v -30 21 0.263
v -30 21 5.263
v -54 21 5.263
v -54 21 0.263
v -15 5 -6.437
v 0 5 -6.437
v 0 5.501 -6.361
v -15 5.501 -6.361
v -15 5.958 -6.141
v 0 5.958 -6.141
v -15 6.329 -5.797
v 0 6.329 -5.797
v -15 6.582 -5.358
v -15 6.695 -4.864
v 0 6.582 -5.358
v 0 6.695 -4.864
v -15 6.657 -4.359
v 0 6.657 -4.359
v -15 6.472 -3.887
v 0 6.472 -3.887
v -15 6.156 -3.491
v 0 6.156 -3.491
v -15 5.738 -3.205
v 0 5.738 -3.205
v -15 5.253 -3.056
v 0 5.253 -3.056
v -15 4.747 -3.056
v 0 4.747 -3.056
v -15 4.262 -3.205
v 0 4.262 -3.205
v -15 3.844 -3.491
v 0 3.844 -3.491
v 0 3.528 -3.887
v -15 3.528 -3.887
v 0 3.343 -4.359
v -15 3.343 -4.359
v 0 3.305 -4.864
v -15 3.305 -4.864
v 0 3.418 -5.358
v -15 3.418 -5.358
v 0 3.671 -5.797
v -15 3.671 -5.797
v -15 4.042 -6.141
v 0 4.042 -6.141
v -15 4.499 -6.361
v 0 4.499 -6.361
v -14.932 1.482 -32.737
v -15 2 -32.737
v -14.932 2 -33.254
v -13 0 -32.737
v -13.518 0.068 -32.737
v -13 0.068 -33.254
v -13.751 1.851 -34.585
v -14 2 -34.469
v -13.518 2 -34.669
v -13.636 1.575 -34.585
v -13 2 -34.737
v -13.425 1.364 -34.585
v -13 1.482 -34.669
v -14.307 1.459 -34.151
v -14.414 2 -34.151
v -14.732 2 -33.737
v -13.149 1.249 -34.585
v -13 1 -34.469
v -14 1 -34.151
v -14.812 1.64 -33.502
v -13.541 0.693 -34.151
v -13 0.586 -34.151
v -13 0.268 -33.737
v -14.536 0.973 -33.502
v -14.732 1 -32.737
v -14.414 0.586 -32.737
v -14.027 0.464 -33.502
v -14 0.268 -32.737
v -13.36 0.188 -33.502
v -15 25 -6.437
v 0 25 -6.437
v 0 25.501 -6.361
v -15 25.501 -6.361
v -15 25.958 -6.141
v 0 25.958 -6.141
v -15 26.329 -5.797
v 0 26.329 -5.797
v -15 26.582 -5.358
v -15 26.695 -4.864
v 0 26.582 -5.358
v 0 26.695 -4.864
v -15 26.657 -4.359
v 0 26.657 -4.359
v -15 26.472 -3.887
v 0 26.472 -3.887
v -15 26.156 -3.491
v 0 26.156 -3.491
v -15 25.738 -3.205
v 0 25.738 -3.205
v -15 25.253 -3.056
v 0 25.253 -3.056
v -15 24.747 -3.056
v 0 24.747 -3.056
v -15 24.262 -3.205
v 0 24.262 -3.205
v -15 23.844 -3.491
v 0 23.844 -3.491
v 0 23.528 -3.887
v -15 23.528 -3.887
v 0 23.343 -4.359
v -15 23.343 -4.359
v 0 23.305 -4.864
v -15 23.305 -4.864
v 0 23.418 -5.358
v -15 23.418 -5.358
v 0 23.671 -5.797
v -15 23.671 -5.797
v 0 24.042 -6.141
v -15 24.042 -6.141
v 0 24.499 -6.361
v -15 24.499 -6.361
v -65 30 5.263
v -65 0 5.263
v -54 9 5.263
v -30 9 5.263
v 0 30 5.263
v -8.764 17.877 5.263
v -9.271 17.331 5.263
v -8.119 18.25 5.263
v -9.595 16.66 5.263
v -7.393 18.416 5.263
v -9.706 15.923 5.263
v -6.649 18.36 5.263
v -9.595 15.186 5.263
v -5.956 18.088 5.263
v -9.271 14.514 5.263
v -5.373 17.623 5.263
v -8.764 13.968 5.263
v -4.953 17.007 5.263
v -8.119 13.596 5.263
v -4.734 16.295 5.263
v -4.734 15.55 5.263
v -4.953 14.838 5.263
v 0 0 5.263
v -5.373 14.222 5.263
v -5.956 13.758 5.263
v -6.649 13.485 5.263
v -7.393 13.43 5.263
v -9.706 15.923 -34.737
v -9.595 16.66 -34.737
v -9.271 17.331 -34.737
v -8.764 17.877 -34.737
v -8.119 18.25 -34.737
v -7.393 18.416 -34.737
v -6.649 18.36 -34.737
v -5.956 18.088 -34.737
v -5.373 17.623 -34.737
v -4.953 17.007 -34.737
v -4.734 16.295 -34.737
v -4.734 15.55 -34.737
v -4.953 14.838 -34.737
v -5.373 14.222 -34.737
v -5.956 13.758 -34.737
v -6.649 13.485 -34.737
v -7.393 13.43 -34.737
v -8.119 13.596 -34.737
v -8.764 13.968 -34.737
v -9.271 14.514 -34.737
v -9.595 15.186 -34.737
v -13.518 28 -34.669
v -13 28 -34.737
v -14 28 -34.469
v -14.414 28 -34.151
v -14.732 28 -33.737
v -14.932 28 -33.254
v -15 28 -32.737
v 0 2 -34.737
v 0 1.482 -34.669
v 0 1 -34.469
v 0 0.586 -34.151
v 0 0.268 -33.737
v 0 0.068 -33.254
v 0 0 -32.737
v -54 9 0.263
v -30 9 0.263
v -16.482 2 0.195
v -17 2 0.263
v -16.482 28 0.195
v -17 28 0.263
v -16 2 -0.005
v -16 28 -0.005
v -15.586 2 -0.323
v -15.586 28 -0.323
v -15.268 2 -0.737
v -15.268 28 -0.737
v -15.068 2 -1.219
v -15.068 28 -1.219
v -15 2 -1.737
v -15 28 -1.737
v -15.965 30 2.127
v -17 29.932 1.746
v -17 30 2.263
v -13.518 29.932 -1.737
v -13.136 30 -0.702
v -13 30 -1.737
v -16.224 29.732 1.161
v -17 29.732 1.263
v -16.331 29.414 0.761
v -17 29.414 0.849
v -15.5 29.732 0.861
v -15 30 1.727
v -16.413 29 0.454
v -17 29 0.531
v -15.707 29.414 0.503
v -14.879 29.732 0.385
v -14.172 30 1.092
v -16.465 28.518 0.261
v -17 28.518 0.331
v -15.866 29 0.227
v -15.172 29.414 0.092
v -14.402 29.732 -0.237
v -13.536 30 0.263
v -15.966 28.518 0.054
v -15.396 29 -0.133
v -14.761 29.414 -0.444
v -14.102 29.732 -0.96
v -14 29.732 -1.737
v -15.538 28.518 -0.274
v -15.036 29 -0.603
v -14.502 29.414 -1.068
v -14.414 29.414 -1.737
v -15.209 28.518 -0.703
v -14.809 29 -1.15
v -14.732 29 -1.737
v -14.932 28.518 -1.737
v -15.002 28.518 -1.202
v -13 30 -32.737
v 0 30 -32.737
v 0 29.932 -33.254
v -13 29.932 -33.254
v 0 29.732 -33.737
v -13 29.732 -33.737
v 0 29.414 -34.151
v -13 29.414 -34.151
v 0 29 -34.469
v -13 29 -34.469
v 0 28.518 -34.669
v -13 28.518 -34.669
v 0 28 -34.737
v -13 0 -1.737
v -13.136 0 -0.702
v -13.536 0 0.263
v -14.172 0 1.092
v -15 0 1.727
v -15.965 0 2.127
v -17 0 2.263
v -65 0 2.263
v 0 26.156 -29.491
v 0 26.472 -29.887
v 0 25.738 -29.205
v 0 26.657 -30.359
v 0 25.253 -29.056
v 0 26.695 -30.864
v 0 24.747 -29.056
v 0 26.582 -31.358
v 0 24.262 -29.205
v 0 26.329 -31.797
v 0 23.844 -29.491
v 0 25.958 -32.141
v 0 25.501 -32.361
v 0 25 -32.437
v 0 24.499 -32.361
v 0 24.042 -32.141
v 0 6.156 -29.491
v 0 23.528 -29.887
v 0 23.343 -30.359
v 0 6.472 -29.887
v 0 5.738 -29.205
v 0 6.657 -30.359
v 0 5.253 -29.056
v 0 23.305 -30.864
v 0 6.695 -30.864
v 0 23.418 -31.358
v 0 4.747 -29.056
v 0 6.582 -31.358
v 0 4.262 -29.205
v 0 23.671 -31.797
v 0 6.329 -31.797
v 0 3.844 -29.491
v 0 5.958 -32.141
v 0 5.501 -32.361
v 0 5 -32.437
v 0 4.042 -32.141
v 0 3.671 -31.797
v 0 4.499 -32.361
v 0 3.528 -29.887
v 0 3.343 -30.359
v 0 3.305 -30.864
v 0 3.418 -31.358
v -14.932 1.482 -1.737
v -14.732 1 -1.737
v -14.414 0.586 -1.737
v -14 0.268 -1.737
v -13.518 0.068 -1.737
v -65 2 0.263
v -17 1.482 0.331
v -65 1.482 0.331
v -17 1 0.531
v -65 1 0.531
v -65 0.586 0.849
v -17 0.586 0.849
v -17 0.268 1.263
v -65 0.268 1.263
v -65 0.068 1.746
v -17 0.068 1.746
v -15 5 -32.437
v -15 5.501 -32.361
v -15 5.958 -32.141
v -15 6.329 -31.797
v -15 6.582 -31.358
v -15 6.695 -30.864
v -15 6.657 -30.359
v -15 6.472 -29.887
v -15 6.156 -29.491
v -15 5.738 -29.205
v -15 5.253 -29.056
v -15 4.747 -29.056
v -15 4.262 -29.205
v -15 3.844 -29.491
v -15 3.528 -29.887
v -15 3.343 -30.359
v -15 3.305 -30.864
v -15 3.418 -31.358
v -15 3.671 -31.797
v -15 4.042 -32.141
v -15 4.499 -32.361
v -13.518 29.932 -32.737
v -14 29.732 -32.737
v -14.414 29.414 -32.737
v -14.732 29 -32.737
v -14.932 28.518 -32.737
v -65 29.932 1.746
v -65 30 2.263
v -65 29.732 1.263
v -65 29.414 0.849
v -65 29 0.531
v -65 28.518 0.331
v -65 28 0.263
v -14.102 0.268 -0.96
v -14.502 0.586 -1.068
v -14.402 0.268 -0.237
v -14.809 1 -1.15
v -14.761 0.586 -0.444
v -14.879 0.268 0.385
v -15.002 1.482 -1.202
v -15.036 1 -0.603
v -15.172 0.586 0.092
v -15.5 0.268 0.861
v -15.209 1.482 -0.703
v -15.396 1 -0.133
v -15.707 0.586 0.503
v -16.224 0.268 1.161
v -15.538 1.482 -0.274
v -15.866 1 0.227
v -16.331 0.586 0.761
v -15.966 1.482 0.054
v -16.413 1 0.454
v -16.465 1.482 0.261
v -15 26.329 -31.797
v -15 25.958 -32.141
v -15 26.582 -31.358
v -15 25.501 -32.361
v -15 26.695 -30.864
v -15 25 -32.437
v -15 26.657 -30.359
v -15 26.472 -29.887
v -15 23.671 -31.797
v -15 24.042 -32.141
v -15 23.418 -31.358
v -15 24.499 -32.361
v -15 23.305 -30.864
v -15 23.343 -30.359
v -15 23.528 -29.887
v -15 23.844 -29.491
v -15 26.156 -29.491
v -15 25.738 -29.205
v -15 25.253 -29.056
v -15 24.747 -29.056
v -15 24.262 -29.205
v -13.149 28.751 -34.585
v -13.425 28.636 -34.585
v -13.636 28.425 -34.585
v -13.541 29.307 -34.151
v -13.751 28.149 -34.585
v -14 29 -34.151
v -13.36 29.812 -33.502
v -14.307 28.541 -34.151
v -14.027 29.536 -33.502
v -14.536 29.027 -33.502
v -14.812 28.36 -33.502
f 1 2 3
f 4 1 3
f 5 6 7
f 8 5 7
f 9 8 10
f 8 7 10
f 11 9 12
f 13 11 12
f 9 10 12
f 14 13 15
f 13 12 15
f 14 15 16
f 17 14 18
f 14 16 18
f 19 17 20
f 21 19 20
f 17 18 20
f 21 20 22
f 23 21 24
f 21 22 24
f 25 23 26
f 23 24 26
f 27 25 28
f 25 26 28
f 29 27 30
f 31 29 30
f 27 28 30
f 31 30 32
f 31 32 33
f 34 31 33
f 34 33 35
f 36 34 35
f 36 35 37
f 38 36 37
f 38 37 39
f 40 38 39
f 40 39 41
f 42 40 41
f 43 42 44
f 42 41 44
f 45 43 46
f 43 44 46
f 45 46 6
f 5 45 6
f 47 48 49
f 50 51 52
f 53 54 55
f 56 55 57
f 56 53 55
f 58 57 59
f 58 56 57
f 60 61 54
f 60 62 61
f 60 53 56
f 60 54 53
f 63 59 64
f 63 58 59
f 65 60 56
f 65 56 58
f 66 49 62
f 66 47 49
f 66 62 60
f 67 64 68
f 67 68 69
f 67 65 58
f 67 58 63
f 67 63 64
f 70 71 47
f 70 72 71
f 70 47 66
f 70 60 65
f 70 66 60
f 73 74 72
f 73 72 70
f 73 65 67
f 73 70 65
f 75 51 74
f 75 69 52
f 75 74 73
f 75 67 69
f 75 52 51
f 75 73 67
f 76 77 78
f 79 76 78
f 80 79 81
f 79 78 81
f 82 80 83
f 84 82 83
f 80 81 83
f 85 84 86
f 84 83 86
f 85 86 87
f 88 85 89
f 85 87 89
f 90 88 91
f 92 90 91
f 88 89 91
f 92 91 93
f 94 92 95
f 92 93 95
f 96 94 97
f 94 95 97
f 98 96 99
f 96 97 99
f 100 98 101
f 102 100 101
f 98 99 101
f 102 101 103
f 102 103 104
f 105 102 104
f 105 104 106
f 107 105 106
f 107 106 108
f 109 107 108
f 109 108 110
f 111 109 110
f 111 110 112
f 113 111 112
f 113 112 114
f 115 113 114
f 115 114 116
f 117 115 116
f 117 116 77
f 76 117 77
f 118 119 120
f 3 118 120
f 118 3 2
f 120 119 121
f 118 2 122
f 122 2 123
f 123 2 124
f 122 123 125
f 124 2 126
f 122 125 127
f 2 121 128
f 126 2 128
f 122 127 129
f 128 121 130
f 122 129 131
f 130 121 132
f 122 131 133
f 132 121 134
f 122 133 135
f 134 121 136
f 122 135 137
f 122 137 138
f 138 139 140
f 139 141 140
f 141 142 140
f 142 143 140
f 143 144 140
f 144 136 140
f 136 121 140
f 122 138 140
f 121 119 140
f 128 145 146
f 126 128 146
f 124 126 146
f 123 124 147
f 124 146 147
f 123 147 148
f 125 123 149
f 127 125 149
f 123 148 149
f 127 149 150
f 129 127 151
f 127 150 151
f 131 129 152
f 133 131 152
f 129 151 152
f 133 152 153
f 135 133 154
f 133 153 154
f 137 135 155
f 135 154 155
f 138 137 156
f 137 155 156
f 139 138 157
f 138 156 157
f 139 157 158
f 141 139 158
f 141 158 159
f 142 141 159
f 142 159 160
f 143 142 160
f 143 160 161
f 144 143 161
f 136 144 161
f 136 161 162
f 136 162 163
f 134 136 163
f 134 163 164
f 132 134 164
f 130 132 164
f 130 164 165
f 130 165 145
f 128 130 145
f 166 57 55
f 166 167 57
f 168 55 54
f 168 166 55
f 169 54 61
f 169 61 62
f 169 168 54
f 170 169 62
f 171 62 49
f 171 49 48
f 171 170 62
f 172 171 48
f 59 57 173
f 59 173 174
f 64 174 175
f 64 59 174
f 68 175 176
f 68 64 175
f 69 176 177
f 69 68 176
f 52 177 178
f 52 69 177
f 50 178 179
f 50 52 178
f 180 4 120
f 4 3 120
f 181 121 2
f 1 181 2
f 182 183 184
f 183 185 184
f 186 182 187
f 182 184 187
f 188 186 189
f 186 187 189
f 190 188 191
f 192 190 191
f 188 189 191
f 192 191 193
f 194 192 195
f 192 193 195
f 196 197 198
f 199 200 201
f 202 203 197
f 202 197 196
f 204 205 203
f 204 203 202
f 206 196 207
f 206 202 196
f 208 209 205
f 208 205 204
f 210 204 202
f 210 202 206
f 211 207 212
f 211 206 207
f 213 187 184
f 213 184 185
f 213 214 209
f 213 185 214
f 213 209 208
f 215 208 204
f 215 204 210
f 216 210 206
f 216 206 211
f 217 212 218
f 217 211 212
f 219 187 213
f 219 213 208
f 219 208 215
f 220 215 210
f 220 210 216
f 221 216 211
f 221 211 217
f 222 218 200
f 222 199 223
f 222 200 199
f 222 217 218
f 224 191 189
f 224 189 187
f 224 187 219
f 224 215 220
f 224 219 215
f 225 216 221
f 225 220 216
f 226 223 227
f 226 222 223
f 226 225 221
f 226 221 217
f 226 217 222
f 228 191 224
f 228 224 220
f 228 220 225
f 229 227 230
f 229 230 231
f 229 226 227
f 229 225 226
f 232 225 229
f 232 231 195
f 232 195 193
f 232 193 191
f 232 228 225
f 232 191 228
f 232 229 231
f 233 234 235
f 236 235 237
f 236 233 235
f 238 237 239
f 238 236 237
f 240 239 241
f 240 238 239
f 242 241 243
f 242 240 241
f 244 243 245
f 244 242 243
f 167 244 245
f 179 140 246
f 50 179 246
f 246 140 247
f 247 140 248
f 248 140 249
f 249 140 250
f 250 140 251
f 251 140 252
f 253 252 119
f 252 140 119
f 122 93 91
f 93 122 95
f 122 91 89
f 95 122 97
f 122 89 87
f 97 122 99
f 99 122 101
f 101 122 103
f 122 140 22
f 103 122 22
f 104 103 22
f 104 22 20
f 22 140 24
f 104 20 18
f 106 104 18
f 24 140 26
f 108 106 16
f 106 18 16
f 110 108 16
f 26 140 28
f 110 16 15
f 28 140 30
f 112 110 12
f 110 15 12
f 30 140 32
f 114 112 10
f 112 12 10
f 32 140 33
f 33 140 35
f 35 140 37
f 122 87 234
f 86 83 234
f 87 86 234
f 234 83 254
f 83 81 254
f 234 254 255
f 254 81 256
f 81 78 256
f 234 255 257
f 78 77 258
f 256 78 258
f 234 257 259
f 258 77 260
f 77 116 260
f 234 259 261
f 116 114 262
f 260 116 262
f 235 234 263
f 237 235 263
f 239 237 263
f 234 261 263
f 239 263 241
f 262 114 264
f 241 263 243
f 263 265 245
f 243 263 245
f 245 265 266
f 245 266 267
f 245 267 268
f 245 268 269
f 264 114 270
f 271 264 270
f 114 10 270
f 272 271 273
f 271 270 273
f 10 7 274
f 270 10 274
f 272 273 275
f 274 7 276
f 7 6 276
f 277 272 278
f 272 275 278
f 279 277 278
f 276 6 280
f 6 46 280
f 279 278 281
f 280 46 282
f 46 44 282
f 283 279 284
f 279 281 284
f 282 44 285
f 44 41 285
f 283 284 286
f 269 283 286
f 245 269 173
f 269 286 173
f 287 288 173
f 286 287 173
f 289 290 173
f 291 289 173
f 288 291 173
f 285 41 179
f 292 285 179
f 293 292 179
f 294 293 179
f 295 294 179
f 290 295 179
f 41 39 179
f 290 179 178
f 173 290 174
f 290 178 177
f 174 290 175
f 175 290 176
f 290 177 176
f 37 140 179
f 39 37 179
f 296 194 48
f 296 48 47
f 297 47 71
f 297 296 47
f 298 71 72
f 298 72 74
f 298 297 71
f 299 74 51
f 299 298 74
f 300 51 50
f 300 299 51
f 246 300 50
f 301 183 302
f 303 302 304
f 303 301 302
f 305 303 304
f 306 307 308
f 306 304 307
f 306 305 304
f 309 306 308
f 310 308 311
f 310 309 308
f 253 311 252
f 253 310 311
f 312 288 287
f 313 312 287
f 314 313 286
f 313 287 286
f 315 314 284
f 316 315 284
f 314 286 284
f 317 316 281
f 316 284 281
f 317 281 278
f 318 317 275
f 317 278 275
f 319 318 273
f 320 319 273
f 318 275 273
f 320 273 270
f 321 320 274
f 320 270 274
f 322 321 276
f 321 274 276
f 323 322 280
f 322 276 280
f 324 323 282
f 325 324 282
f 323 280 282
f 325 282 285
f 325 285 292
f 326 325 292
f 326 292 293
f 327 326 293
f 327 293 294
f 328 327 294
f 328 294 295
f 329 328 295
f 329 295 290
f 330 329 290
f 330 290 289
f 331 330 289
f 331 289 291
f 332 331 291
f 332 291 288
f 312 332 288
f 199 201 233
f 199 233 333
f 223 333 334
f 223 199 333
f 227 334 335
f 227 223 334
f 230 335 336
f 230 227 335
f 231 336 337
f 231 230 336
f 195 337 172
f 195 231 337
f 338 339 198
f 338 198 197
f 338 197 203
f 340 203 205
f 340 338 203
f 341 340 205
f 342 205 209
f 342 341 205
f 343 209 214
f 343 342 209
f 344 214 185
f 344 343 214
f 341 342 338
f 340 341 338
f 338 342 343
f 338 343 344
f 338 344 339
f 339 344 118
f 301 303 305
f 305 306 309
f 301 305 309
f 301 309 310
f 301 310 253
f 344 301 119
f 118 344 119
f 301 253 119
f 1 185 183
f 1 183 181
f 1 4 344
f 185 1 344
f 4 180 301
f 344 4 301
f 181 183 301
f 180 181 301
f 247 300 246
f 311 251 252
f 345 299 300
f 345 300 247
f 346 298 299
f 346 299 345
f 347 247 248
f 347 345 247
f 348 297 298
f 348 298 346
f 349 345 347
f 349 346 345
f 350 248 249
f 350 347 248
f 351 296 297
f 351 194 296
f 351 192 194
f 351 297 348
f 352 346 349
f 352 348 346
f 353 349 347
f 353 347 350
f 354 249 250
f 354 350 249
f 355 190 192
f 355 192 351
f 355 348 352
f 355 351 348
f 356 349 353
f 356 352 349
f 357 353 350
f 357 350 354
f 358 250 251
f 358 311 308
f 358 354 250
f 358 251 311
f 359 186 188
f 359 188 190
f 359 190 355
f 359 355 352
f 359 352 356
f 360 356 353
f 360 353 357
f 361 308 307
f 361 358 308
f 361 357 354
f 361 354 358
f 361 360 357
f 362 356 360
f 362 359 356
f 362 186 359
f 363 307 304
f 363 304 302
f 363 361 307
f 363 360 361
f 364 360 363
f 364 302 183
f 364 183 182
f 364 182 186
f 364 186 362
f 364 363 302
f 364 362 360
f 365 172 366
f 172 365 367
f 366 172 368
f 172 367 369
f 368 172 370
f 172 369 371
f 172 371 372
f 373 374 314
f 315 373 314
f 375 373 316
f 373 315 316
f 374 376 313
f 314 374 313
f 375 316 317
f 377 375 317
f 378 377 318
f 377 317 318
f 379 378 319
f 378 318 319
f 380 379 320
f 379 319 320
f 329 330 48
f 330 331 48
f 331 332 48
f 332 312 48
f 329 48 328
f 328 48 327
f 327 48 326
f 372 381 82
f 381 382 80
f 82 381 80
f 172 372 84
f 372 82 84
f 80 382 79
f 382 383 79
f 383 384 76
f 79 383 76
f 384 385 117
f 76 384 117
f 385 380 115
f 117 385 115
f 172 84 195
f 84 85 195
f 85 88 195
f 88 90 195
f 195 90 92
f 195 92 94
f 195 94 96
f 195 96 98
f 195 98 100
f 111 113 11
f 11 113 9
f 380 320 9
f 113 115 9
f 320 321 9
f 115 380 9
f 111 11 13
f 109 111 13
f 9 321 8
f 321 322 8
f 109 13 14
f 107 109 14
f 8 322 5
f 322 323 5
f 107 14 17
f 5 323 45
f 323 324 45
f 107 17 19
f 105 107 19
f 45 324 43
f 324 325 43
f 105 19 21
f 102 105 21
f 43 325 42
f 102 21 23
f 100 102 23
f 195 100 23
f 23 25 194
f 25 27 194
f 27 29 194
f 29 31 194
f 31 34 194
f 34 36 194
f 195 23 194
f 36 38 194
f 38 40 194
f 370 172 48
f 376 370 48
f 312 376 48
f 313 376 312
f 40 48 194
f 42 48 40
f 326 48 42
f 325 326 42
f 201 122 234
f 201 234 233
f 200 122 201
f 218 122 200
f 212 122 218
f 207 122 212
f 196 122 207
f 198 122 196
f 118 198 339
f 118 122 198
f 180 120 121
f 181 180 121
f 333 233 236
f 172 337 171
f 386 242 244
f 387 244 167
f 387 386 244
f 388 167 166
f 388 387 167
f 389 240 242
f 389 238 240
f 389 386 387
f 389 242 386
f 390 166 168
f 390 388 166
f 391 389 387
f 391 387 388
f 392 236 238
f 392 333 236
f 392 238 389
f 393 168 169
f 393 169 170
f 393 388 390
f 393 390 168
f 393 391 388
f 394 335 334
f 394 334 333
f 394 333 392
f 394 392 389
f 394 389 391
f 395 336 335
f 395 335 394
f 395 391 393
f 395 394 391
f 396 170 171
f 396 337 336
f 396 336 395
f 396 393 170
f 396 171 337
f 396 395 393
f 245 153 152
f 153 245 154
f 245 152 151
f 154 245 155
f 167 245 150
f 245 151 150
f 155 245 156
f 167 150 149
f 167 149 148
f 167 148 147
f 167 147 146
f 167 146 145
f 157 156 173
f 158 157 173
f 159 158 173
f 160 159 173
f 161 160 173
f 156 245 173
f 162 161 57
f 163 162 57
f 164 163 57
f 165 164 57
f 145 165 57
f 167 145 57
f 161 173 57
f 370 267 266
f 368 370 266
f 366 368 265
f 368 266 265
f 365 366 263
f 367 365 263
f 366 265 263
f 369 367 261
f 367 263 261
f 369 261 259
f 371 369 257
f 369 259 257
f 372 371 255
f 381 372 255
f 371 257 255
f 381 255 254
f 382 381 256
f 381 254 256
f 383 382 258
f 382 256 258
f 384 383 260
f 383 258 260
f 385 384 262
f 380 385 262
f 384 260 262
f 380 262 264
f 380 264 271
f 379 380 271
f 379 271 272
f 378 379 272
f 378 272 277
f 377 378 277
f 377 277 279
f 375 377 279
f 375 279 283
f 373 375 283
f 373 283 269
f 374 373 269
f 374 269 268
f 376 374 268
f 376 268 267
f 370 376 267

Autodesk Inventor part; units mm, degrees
ref_plane "YZ Plane" through (0, 0, 0) normal (1, 0, 0) x (0, 1, 0)
ref_plane "XZ Plane" through (0, 0, 0) normal (0, 1, 0) x (-1, 0, 0)
ref_plane "XY Plane" through (0, 0, 0) normal (0, 0, 1) x (1, 0, 0)
sketch "Skizze1" plane through (0, 0, 0) normal (0, 1, 0) x (-1, 0, 0)
  line L0 (65, 5.2632) -> (0, 5.2632)
  line L1 (0, 5.2632) -> (0, -34.7368)
  line L2 (0, -34.7368) -> (15, -34.7368)
  line L3 (15, -34.7368) -> (15, 0.2632)
  line L4 (15, 0.2632) -> (65, 0.2632)
  line L5 (65, 0.2632) -> (65, 5.2632)
  point P0 (0, 0)
  dimension "d0" = 5
  dimension "d1" = 15
  dimension "d2" = 40
  dimension "d5" = 65
extrude "Extrusion1" add sketch "Skizze1" along normal blind 30
sketch "Skizze2" plane through (-65, 0, 5.2632) normal (0, 0, 1) x (1, 0, 0)
  line L0 (11, 9) -> (35, 9)
  line L1 (35, 9) -> (35, 21)
  line L2 (35, 21) -> (11, 21)
  line L3 (11, 21) -> (11, 9)
  line L4 (65, 0) -> (65, 30) projected
  line L5 (0, 30) -> (65, 30) projected
  dimension "d6" = 30
  dimension "d7" = 24
  dimension "d8" = 12
  dimension "d9" = 9
extrude "Extrusion2" cut sketch "Skizze2" against normal blind 5
sketch "Skizze3" plane through (0, 0, 5.2632) normal (1, 0, 0) x (0, 0, -1)
  circle A0 centre (10, 5) radius 1.7
  circle A1 centre (36, 5) radius 1.7
  circle A2 centre (10, 25) radius 1.7
  circle A3 centre (36, 25) radius 1.7
  line L0 (0, 0) -> (0, 30) projected
  line L1 (0, 30) -> (40, 30) projected
  line L2 (40, 0) -> (40, 30) projected
  point P0 (5.2632, 0)
  dimension "d12" = 3.4
  dimension "d13" = 3.4
  dimension "d14" = 3.4
  dimension "d15" = 3.4
  dimension "d16" = 10
  dimension "d17" = 20
  dimension "d18" = 5
  dimension "d19" = 10
  dimension "d20" = 4
  dimension "d21" = 20
  dimension "d22" = 4
  dimension "d23" = 5
extrude "Extrusion3" cut sketch "Skizze3" against normal blind 20
sketch "Skizze4" plane through (0, 0, 5.2632) normal (1, 0, 0) x (0, 0, -1)
  point P0 (5.2632, 0)
sketch "Skizze5" plane through (0, 0, -34.7368) normal (0, 0, -1) x (-1, 0, 0)
  arc A0 (0.0007, -11.0976) -> (-0.0008, 42.9427) centre (7.2057, 15.9227) ccw projected
  circle A1 centre (7.2057, 15.9227) radius 2.5
  point P0 (0, 0)
  dimension "d26" = 5
extrude "Extrusion4" cut sketch "Skizze5" against normal through all
fillet "Rundung1" radius 2 8 edges at (-15, 30, -17.2368) (-15, 0, -17.2368) (-15, 15, -34.7368) (-40, 30, 0.2632) (-15, 15, 0.2632) (-40, 0, 0.2632) (-7.5, 30, -34.7368) (-7.5, 0, -34.7368)
properties part number "L-Halterung Servo"
